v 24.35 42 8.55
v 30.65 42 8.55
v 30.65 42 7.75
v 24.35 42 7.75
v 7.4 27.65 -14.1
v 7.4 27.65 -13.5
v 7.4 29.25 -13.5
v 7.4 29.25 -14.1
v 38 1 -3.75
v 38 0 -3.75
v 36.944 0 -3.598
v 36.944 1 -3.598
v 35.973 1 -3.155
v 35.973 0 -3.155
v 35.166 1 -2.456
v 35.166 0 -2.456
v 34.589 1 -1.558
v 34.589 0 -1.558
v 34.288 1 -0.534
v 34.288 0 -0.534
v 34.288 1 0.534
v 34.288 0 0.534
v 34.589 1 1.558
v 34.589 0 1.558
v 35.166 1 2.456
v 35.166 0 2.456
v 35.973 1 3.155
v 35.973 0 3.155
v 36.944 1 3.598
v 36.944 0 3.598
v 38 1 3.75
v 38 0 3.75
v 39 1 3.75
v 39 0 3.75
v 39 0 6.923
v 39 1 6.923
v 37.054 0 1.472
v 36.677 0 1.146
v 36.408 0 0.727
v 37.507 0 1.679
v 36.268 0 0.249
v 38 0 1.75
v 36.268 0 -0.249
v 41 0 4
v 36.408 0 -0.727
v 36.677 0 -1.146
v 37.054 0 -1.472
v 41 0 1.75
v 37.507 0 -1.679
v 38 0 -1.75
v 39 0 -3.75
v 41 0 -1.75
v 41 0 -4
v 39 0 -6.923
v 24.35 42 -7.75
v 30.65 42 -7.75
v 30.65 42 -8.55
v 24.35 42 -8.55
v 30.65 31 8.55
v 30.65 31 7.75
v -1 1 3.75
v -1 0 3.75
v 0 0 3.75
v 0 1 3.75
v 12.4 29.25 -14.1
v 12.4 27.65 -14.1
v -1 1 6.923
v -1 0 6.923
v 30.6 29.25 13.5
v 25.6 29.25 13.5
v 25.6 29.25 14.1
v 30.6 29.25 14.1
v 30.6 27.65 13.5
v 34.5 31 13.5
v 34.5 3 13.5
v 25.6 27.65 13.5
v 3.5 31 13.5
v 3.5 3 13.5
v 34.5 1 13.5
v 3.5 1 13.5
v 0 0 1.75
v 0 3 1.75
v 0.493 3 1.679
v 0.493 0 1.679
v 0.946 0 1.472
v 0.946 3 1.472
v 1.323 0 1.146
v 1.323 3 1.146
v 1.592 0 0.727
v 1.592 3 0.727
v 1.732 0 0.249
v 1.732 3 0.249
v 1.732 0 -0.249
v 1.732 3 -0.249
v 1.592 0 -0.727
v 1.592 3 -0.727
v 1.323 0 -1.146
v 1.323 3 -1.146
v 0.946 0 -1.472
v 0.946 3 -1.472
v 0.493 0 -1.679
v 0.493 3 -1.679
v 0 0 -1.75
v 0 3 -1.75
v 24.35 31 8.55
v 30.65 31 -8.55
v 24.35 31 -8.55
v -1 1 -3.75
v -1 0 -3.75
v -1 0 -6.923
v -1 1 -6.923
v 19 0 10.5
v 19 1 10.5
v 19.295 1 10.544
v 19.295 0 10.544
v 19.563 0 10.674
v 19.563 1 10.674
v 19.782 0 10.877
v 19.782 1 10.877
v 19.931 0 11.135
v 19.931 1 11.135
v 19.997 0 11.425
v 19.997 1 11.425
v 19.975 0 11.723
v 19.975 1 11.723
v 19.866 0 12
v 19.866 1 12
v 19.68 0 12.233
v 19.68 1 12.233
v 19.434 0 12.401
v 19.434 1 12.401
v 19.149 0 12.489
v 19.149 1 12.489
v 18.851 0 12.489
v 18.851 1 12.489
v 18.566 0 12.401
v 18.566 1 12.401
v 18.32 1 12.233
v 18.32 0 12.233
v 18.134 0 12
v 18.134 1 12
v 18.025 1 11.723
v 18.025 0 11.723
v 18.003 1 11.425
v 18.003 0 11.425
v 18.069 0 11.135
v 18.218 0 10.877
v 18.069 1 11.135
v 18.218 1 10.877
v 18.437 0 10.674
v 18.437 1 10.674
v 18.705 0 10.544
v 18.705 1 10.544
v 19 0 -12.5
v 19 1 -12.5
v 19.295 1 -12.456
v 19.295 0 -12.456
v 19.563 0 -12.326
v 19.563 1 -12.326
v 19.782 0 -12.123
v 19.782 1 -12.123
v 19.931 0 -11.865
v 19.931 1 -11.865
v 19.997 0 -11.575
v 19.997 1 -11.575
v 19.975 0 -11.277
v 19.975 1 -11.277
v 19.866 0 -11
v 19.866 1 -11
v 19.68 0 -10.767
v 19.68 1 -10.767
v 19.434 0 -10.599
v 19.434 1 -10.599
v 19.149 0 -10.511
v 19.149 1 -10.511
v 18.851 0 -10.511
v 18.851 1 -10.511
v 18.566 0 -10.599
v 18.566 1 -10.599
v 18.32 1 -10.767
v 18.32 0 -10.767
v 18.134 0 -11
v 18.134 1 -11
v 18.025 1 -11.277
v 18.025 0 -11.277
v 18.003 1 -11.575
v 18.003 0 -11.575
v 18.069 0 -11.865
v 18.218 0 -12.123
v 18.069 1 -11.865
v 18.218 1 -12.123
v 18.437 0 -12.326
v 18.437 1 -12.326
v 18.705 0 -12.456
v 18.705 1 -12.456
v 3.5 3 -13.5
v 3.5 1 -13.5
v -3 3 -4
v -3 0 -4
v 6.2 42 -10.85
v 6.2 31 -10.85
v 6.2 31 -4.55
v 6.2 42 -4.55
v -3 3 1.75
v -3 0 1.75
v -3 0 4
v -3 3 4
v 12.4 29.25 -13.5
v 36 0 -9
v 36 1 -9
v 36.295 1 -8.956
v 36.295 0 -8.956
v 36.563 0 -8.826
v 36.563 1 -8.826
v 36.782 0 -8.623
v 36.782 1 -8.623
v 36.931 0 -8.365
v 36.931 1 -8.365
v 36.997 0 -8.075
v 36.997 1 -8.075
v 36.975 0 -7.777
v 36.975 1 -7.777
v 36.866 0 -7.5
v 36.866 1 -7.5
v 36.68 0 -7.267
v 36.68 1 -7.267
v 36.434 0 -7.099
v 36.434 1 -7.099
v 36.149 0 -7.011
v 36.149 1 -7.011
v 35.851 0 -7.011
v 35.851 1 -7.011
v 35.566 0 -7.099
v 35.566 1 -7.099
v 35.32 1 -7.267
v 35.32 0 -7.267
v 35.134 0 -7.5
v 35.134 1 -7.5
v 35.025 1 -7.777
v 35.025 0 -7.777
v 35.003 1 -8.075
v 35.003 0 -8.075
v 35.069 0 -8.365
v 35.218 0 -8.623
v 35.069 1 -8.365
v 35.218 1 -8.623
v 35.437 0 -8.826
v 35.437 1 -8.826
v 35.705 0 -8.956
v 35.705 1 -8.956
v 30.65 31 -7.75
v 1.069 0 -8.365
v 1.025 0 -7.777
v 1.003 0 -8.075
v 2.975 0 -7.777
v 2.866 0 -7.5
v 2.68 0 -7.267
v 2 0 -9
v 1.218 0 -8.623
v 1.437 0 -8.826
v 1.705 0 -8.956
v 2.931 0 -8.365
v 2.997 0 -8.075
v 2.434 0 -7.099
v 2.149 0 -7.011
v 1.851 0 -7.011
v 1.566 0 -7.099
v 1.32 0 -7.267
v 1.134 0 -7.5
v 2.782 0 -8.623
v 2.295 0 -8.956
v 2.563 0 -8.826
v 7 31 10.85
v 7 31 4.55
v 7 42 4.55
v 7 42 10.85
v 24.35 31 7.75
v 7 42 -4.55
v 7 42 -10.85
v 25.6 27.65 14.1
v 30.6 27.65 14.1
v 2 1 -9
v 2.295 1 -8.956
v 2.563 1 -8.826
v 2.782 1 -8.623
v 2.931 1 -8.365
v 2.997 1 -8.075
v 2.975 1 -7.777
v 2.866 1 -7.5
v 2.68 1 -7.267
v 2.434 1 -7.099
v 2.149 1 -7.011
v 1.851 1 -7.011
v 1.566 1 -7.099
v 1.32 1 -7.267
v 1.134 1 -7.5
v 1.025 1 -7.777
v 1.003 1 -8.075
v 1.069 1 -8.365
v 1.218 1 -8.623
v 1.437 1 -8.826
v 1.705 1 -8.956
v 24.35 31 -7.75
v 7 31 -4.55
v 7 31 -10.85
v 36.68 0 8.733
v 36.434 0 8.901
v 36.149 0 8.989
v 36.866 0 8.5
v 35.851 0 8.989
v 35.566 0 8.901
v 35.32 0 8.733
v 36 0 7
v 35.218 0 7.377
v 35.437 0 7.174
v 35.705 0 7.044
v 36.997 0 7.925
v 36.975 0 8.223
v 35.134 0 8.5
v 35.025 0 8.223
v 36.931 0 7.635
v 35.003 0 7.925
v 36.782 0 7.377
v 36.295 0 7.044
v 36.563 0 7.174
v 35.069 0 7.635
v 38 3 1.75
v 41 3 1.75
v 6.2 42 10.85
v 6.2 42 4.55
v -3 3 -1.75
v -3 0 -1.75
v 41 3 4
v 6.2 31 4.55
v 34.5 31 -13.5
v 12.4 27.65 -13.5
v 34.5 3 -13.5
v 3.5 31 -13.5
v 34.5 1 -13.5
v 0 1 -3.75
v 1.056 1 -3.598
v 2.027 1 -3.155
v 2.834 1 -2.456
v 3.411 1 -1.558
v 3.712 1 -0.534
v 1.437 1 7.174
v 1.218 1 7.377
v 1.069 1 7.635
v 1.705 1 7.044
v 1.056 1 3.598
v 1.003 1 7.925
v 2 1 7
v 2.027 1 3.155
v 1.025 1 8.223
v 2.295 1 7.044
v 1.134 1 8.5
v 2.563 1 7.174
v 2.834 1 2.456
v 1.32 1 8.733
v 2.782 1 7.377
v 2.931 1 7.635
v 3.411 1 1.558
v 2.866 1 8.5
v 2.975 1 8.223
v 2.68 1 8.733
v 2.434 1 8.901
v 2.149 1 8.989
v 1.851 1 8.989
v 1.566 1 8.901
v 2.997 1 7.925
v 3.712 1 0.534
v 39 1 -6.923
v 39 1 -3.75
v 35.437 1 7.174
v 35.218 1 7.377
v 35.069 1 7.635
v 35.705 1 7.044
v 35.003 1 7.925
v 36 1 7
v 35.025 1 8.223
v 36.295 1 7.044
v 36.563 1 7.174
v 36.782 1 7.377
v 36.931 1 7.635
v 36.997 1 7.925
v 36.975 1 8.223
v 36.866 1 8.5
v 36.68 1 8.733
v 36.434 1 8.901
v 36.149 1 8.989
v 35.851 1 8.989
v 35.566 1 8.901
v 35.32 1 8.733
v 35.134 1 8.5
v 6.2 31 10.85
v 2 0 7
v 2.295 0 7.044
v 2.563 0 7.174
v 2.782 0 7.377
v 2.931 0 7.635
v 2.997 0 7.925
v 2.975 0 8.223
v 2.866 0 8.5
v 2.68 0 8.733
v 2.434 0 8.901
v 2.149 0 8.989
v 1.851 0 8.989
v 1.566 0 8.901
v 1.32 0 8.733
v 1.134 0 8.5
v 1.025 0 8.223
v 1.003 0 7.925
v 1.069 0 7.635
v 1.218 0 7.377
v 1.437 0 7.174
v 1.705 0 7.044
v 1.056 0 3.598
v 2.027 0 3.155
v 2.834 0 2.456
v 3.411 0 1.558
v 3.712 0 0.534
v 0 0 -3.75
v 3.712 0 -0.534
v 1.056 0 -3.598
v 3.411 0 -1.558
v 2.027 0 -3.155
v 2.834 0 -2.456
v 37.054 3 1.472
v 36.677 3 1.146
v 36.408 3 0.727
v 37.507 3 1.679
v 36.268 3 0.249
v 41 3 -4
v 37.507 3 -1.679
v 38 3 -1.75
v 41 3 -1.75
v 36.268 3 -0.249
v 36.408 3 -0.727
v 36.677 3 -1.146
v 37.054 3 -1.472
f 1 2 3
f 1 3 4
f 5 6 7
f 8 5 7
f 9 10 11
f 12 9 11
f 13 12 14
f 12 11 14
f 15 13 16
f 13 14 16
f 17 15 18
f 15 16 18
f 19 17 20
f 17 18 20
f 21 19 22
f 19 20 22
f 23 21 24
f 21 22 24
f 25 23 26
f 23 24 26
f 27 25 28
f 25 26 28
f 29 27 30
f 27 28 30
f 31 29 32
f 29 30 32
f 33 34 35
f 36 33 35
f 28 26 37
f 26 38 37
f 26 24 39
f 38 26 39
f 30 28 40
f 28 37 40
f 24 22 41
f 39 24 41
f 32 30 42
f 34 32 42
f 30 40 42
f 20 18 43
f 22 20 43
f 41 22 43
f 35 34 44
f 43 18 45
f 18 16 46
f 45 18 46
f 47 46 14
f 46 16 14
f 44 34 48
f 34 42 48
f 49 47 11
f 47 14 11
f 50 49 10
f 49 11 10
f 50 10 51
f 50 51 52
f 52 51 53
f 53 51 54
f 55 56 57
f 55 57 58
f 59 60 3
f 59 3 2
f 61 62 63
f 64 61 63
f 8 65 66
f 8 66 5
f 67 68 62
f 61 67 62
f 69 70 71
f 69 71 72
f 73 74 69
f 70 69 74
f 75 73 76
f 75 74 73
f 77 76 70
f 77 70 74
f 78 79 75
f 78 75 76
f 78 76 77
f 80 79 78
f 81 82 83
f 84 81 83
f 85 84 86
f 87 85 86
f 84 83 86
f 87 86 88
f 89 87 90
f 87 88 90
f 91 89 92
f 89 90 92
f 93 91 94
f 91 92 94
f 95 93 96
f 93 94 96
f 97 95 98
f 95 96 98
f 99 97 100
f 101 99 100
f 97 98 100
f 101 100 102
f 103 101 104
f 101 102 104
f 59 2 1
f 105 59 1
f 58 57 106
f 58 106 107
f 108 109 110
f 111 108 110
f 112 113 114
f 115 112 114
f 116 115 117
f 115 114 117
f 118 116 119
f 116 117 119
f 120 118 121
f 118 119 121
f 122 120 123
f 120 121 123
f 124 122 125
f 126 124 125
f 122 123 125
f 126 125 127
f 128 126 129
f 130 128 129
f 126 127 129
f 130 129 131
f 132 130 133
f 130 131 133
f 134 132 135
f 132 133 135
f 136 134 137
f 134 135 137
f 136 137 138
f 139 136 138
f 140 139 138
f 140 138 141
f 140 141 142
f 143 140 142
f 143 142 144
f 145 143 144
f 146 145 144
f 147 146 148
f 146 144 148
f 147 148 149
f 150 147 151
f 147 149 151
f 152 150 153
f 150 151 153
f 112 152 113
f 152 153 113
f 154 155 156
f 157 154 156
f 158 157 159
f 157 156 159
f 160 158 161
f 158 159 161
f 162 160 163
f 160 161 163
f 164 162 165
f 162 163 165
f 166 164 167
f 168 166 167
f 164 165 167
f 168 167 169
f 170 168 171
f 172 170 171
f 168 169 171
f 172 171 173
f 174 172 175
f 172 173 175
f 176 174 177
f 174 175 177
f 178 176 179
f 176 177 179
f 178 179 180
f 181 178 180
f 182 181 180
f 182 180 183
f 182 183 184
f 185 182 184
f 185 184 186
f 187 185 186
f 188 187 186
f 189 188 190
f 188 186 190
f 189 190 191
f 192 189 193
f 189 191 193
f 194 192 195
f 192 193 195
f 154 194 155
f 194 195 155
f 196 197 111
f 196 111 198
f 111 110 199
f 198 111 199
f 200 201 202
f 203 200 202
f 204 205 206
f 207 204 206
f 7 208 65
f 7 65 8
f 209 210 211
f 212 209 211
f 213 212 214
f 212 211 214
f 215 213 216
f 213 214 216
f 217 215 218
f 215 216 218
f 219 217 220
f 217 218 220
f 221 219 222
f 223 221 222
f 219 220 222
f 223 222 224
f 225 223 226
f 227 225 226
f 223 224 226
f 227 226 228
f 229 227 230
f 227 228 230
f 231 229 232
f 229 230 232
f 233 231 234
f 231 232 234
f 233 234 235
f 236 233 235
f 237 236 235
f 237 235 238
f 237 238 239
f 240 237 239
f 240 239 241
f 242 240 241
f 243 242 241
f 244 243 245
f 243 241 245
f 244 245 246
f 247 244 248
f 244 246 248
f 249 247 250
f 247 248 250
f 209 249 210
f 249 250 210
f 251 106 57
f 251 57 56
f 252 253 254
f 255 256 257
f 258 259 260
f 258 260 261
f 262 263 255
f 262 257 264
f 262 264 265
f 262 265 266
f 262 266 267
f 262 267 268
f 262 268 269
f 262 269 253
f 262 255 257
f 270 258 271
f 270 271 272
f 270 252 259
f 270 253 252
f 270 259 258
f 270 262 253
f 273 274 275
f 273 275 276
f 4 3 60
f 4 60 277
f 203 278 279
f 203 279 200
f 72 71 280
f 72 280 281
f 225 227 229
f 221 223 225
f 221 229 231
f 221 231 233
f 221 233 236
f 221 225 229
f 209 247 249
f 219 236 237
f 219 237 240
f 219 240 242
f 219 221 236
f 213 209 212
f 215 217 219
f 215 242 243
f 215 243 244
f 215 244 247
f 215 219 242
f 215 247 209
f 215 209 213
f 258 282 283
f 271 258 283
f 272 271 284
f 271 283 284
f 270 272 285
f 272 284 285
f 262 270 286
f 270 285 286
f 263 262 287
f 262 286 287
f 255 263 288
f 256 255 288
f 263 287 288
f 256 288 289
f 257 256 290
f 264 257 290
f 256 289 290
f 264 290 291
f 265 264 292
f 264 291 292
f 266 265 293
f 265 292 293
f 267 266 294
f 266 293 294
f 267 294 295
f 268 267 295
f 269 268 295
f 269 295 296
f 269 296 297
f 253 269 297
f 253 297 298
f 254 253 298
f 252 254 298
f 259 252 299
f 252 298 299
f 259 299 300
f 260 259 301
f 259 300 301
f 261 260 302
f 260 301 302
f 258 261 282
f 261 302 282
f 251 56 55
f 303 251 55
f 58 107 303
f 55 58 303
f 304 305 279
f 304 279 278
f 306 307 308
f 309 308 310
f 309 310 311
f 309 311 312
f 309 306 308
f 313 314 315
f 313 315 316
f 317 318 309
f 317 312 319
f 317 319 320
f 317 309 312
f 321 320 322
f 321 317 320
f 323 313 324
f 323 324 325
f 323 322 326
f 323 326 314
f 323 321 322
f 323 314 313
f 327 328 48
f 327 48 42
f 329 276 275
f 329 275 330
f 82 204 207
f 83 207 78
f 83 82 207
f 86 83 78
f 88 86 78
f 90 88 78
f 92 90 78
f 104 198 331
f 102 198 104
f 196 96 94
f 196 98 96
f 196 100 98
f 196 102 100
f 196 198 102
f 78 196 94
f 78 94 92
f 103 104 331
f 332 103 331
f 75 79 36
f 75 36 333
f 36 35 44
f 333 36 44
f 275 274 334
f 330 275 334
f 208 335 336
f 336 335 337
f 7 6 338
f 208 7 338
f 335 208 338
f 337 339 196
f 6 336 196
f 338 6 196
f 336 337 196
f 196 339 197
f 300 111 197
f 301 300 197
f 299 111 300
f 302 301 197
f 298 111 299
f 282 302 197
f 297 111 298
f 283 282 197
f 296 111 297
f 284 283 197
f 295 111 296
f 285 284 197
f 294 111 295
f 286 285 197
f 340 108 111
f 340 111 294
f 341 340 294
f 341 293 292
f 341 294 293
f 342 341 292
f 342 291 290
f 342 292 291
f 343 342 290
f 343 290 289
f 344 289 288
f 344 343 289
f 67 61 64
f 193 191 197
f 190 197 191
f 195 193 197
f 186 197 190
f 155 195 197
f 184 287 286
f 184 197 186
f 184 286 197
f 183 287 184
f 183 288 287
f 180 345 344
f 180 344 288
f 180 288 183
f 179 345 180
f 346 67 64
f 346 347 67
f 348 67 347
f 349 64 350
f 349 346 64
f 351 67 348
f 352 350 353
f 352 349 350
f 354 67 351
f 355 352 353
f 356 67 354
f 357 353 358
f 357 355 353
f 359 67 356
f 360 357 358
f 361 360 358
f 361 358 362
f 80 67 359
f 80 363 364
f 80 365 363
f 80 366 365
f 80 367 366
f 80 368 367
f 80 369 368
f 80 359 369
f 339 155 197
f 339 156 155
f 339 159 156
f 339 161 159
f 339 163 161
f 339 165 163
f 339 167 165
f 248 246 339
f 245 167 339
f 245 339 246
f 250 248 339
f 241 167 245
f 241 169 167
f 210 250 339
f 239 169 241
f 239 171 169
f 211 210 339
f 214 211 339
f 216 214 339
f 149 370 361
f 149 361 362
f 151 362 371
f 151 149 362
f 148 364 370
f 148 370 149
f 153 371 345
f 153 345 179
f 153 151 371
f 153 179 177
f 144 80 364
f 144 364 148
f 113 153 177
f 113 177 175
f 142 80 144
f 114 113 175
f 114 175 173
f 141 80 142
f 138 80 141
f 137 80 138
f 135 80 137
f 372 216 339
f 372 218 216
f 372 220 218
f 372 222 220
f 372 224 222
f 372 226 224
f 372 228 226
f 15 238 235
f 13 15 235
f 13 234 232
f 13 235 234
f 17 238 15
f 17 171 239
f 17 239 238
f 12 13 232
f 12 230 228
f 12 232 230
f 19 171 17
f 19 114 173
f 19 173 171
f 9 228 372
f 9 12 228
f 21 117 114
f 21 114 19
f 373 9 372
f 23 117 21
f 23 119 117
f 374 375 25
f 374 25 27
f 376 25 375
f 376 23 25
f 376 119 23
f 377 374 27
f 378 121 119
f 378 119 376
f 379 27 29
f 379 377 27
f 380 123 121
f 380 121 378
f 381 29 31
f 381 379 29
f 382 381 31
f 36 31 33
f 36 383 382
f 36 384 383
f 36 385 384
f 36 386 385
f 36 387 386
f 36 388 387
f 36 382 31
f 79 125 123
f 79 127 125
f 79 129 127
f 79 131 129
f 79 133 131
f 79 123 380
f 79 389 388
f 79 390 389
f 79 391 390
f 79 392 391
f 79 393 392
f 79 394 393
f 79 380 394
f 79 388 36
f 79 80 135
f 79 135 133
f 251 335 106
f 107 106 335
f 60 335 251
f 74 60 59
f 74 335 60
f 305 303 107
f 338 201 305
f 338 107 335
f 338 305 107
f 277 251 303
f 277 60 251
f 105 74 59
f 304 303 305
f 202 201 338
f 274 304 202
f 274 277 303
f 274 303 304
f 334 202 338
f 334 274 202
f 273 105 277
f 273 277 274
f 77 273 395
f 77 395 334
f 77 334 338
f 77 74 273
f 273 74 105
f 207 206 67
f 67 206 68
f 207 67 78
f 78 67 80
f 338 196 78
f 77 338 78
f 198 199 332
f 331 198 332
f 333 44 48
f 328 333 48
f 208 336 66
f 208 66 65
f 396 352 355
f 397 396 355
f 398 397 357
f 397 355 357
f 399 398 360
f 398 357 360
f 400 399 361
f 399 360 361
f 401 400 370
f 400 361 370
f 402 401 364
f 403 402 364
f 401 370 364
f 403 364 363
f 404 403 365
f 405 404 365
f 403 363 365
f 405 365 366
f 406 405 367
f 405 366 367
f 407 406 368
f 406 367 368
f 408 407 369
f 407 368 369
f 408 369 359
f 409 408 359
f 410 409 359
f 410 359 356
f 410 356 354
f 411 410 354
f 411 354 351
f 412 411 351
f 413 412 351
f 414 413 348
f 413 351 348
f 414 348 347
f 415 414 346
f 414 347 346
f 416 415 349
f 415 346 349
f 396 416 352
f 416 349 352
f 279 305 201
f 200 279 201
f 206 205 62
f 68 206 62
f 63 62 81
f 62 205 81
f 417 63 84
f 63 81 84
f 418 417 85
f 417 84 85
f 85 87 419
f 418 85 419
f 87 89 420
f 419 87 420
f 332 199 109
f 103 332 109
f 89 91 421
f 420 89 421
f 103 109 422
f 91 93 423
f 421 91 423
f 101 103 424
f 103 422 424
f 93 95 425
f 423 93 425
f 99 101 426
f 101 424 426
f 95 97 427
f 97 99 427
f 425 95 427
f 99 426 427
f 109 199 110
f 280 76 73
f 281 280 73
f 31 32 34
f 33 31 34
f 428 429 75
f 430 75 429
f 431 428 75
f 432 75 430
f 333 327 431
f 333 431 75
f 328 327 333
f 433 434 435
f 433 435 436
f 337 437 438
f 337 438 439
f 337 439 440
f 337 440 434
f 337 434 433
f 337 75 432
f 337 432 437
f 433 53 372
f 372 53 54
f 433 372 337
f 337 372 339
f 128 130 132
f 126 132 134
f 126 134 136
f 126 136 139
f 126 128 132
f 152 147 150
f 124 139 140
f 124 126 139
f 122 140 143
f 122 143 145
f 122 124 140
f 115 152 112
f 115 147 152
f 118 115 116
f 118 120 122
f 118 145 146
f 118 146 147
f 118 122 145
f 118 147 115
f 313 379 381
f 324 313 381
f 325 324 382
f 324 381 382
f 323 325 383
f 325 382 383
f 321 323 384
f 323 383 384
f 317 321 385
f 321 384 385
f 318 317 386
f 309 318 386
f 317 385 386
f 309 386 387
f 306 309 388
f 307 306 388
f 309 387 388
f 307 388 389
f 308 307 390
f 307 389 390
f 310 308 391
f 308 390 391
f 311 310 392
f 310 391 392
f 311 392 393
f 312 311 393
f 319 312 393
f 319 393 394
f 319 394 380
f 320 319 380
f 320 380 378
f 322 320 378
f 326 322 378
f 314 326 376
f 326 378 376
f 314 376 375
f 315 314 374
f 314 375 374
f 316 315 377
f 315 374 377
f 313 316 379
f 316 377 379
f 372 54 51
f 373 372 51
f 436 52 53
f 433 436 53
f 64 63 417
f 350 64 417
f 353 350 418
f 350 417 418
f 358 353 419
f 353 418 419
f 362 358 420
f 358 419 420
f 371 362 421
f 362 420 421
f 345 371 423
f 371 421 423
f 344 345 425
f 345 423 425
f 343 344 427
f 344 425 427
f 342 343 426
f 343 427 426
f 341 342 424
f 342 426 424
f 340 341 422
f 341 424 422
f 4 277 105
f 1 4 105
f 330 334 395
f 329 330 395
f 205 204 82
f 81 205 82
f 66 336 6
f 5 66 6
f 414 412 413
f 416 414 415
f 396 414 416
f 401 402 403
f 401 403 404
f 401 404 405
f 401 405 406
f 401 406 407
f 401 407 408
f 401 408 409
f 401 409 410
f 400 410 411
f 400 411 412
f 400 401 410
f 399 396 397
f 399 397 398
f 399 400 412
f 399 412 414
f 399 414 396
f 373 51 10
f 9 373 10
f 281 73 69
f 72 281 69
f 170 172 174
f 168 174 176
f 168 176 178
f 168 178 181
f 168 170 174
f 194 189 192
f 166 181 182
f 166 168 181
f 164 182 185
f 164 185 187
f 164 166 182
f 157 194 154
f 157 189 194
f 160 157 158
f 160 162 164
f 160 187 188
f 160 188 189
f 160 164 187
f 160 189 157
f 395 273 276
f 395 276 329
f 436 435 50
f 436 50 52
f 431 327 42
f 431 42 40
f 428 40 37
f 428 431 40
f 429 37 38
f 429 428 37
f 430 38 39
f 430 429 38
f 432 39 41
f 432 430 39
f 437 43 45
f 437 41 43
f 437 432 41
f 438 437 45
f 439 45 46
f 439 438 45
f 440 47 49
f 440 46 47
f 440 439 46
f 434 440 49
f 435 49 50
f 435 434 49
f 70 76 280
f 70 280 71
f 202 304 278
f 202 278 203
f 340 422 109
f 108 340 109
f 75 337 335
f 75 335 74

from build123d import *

# Parameters (mm, degrees)
EXTRUDE_364_DEPTH   = 3
CUT_EXTRUDE_1_DEPTH = 44.269504273
CUT_EXTRUDE_2_DEPTH = 1
SKETCH_4_W          = 31
SKETCH_4_H          = 27
EXTRUDE_1_DEPTH     = 28
SKETCH_5_W          = 0.8
SKETCH_5_H          = 6.3
SKETCH_5_W_2        = 6.3
SKETCH_5_H_2        = 0.8
EXTRUDE_2_DEPTH     = 11
SKETCH_6_W          = 5
SKETCH_6_H          = 1.6
EXTRUDE_3_DEPTH     = 0.6
SKETCH_7_W          = 5
SKETCH_7_H          = 1.6
EXTRUDE_4_DEPTH     = 0.6
SKETCH_8_R          = 1
EXTRUDE_5_DEPTH     = 1


with BuildPart() as part:
    # ｽｹｯﾁ1 → Extrude 364 (new body)
    with BuildSketch(Plane(origin=(0, 0, 0), x_dir=(1, 0, 0), z_dir=(0, 1, 0))):
        Polygon((-3, 4), (-3, -4), (3.5, -13.5), (34.5, -13.5), (41, -4), (41, 4), (34.5, 13.5), (3.5, 13.5), align=None)
    extrude(amount=EXTRUDE_364_DEPTH)

    # ｽｹｯﾁ2 → ｶｯﾄ - 押し出し1 (cut, through all)
    with BuildSketch(Plane(origin=(0, 3, 0), x_dir=(-1, 0, 0), z_dir=(0, 1, 0))):
        with BuildLine():
            Line((-41, 1.75), (-38, 1.75))
            ThreePointArc((-38, 1.75), (-36.25, 0), (-38, -1.75))
            Line((-38, -1.75), (-41, -1.75))
            Line((-41, -1.75), (-41, 1.75))
        make_face()
        with BuildLine():
            Line((3, 1.75), (0, 1.75))
            ThreePointArc((0, 1.75), (-1.75, 0), (0, -1.75))
            Line((0, -1.75), (3, -1.75))
            Line((3, -1.75), (3, 1.75))
        make_face()
    extrude(amount=-CUT_EXTRUDE_1_DEPTH, mode=Mode.SUBTRACT)

    # ｽｹｯﾁ3 → ｶｯﾄ - 押し出し2 (cut)
    with BuildSketch(Plane.XZ):
        Polygon((39, 3.75), (39, 6.923076923), (34.5, 13.5), (3.5, 13.5), (-1, 6.923076923), (-1, 3.75), (-0.747712751, 3.75), (4.554918828, 11.5), (33.445081172, 11.5), (38.747712751, 3.75), align=None)
        with BuildLine():
            Line((38, 3.75), (38.747712751, 3.75))
            Line((38.747712751, 3.75), (33.445081172, 11.5))
            Line((33.445081172, 11.5), (4.554918828, 11.5))
            Line((4.554918828, 11.5), (-0.747712751, 3.75))
            Line((-0.747712751, 3.75), (0, 3.75))
            ThreePointArc((0, 3.75), (3.75, 0), (0, -3.75))
            Line((0, -3.75), (-0.747712751, -3.75))
            Line((-0.747712751, -3.75), (4.554918828, -11.5))
            Line((4.554918828, -11.5), (33.445081172, -11.5))
            Line((33.445081172, -11.5), (38.747712751, -3.75))
            Line((38.747712751, -3.75), (38, -3.75))
            ThreePointArc((38, -3.75), (34.25, 0), (38, 3.75))
        make_face()
        Polygon((39, -3.75), (38.747712751, -3.75), (33.445081172, -11.5), (4.554918828, -11.5), (-0.747712751, -3.75), (-1, -3.75), (-1, -6.923076923), (3.5, -13.5), (34.5, -13.5), (39, -6.923076923), align=None)
    extrude(amount=-CUT_EXTRUDE_2_DEPTH, mode=Mode.SUBTRACT)

    # ｽｹｯﾁ4 → ﾎﾞｽ - 押し出し1 (add)
    with BuildSketch(Plane(origin=(0, 3, 0), x_dir=(-1, 0, 0), z_dir=(0, 1, 0))):
        with Locations((-19, 0)):
            Rectangle(SKETCH_4_W, SKETCH_4_H)
    extrude(amount=EXTRUDE_1_DEPTH)

    # ｽｹｯﾁ5 → ﾎﾞｽ - 押し出し2 (add)
    with BuildSketch(Plane(origin=(0, 31, 0), x_dir=(-1, 0, 0), z_dir=(0, 1, 0))):
        with Locations((-6.6, -7.7)):
            Rectangle(SKETCH_5_W, SKETCH_5_H)
        with Locations((-6.6, 7.7)):
            Rectangle(SKETCH_5_W, SKETCH_5_H)
        with Locations((-27.5, -8.15)):
            Rectangle(SKETCH_5_W_2, SKETCH_5_H_2)
        with Locations((-27.5, 8.15)):
            Rectangle(SKETCH_5_W_2, SKETCH_5_H_2)
    extrude(amount=EXTRUDE_2_DEPTH)

    # ｽｹｯﾁ6 → ﾎﾞｽ - 押し出し3 (add)
    with BuildSketch(Plane.XY.offset(13.5)):
        with Locations((28.1, 28.45)):
            Rectangle(SKETCH_6_W, SKETCH_6_H)
    extrude(amount=EXTRUDE_3_DEPTH)

    # ｽｹｯﾁ7 → ﾎﾞｽ - 押し出し4 (add)
    with BuildSketch(Plane(origin=(0, 0, -13.5), x_dir=(-1, 0, 0), z_dir=(0, 0, -1))):
        with Locations((-9.9, 28.45)):
            Rectangle(SKETCH_7_W, SKETCH_7_H)
    extrude(amount=EXTRUDE_4_DEPTH)

    # ｽｹｯﾁ8 → ﾎﾞｽ - 押し出し5 (add)
    with BuildSketch(Plane.XZ.offset(-1)):
        with Locations(Location((19, 11.5, 0), (0, 0, 270))):
            Circle(SKETCH_8_R)
        with Locations(Location((19, -11.5, 0), (0, 0, 270))):
            Circle(SKETCH_8_R)
        with Locations(Location((36, 8, 0), (0, 0, 270))):
            Circle(SKETCH_8_R)
        with Locations(Location((36, -8, 0), (0, 0, 270))):
            Circle(SKETCH_8_R)
        with Locations(Location((2, 8, 0), (0, 0, 270))):
            Circle(SKETCH_8_R)
        with Locations(Location((2, -8, 0), (0, 0, 270))):
            Circle(SKETCH_8_R)
    extrude(amount=EXTRUDE_5_DEPTH)


solid = part.part
